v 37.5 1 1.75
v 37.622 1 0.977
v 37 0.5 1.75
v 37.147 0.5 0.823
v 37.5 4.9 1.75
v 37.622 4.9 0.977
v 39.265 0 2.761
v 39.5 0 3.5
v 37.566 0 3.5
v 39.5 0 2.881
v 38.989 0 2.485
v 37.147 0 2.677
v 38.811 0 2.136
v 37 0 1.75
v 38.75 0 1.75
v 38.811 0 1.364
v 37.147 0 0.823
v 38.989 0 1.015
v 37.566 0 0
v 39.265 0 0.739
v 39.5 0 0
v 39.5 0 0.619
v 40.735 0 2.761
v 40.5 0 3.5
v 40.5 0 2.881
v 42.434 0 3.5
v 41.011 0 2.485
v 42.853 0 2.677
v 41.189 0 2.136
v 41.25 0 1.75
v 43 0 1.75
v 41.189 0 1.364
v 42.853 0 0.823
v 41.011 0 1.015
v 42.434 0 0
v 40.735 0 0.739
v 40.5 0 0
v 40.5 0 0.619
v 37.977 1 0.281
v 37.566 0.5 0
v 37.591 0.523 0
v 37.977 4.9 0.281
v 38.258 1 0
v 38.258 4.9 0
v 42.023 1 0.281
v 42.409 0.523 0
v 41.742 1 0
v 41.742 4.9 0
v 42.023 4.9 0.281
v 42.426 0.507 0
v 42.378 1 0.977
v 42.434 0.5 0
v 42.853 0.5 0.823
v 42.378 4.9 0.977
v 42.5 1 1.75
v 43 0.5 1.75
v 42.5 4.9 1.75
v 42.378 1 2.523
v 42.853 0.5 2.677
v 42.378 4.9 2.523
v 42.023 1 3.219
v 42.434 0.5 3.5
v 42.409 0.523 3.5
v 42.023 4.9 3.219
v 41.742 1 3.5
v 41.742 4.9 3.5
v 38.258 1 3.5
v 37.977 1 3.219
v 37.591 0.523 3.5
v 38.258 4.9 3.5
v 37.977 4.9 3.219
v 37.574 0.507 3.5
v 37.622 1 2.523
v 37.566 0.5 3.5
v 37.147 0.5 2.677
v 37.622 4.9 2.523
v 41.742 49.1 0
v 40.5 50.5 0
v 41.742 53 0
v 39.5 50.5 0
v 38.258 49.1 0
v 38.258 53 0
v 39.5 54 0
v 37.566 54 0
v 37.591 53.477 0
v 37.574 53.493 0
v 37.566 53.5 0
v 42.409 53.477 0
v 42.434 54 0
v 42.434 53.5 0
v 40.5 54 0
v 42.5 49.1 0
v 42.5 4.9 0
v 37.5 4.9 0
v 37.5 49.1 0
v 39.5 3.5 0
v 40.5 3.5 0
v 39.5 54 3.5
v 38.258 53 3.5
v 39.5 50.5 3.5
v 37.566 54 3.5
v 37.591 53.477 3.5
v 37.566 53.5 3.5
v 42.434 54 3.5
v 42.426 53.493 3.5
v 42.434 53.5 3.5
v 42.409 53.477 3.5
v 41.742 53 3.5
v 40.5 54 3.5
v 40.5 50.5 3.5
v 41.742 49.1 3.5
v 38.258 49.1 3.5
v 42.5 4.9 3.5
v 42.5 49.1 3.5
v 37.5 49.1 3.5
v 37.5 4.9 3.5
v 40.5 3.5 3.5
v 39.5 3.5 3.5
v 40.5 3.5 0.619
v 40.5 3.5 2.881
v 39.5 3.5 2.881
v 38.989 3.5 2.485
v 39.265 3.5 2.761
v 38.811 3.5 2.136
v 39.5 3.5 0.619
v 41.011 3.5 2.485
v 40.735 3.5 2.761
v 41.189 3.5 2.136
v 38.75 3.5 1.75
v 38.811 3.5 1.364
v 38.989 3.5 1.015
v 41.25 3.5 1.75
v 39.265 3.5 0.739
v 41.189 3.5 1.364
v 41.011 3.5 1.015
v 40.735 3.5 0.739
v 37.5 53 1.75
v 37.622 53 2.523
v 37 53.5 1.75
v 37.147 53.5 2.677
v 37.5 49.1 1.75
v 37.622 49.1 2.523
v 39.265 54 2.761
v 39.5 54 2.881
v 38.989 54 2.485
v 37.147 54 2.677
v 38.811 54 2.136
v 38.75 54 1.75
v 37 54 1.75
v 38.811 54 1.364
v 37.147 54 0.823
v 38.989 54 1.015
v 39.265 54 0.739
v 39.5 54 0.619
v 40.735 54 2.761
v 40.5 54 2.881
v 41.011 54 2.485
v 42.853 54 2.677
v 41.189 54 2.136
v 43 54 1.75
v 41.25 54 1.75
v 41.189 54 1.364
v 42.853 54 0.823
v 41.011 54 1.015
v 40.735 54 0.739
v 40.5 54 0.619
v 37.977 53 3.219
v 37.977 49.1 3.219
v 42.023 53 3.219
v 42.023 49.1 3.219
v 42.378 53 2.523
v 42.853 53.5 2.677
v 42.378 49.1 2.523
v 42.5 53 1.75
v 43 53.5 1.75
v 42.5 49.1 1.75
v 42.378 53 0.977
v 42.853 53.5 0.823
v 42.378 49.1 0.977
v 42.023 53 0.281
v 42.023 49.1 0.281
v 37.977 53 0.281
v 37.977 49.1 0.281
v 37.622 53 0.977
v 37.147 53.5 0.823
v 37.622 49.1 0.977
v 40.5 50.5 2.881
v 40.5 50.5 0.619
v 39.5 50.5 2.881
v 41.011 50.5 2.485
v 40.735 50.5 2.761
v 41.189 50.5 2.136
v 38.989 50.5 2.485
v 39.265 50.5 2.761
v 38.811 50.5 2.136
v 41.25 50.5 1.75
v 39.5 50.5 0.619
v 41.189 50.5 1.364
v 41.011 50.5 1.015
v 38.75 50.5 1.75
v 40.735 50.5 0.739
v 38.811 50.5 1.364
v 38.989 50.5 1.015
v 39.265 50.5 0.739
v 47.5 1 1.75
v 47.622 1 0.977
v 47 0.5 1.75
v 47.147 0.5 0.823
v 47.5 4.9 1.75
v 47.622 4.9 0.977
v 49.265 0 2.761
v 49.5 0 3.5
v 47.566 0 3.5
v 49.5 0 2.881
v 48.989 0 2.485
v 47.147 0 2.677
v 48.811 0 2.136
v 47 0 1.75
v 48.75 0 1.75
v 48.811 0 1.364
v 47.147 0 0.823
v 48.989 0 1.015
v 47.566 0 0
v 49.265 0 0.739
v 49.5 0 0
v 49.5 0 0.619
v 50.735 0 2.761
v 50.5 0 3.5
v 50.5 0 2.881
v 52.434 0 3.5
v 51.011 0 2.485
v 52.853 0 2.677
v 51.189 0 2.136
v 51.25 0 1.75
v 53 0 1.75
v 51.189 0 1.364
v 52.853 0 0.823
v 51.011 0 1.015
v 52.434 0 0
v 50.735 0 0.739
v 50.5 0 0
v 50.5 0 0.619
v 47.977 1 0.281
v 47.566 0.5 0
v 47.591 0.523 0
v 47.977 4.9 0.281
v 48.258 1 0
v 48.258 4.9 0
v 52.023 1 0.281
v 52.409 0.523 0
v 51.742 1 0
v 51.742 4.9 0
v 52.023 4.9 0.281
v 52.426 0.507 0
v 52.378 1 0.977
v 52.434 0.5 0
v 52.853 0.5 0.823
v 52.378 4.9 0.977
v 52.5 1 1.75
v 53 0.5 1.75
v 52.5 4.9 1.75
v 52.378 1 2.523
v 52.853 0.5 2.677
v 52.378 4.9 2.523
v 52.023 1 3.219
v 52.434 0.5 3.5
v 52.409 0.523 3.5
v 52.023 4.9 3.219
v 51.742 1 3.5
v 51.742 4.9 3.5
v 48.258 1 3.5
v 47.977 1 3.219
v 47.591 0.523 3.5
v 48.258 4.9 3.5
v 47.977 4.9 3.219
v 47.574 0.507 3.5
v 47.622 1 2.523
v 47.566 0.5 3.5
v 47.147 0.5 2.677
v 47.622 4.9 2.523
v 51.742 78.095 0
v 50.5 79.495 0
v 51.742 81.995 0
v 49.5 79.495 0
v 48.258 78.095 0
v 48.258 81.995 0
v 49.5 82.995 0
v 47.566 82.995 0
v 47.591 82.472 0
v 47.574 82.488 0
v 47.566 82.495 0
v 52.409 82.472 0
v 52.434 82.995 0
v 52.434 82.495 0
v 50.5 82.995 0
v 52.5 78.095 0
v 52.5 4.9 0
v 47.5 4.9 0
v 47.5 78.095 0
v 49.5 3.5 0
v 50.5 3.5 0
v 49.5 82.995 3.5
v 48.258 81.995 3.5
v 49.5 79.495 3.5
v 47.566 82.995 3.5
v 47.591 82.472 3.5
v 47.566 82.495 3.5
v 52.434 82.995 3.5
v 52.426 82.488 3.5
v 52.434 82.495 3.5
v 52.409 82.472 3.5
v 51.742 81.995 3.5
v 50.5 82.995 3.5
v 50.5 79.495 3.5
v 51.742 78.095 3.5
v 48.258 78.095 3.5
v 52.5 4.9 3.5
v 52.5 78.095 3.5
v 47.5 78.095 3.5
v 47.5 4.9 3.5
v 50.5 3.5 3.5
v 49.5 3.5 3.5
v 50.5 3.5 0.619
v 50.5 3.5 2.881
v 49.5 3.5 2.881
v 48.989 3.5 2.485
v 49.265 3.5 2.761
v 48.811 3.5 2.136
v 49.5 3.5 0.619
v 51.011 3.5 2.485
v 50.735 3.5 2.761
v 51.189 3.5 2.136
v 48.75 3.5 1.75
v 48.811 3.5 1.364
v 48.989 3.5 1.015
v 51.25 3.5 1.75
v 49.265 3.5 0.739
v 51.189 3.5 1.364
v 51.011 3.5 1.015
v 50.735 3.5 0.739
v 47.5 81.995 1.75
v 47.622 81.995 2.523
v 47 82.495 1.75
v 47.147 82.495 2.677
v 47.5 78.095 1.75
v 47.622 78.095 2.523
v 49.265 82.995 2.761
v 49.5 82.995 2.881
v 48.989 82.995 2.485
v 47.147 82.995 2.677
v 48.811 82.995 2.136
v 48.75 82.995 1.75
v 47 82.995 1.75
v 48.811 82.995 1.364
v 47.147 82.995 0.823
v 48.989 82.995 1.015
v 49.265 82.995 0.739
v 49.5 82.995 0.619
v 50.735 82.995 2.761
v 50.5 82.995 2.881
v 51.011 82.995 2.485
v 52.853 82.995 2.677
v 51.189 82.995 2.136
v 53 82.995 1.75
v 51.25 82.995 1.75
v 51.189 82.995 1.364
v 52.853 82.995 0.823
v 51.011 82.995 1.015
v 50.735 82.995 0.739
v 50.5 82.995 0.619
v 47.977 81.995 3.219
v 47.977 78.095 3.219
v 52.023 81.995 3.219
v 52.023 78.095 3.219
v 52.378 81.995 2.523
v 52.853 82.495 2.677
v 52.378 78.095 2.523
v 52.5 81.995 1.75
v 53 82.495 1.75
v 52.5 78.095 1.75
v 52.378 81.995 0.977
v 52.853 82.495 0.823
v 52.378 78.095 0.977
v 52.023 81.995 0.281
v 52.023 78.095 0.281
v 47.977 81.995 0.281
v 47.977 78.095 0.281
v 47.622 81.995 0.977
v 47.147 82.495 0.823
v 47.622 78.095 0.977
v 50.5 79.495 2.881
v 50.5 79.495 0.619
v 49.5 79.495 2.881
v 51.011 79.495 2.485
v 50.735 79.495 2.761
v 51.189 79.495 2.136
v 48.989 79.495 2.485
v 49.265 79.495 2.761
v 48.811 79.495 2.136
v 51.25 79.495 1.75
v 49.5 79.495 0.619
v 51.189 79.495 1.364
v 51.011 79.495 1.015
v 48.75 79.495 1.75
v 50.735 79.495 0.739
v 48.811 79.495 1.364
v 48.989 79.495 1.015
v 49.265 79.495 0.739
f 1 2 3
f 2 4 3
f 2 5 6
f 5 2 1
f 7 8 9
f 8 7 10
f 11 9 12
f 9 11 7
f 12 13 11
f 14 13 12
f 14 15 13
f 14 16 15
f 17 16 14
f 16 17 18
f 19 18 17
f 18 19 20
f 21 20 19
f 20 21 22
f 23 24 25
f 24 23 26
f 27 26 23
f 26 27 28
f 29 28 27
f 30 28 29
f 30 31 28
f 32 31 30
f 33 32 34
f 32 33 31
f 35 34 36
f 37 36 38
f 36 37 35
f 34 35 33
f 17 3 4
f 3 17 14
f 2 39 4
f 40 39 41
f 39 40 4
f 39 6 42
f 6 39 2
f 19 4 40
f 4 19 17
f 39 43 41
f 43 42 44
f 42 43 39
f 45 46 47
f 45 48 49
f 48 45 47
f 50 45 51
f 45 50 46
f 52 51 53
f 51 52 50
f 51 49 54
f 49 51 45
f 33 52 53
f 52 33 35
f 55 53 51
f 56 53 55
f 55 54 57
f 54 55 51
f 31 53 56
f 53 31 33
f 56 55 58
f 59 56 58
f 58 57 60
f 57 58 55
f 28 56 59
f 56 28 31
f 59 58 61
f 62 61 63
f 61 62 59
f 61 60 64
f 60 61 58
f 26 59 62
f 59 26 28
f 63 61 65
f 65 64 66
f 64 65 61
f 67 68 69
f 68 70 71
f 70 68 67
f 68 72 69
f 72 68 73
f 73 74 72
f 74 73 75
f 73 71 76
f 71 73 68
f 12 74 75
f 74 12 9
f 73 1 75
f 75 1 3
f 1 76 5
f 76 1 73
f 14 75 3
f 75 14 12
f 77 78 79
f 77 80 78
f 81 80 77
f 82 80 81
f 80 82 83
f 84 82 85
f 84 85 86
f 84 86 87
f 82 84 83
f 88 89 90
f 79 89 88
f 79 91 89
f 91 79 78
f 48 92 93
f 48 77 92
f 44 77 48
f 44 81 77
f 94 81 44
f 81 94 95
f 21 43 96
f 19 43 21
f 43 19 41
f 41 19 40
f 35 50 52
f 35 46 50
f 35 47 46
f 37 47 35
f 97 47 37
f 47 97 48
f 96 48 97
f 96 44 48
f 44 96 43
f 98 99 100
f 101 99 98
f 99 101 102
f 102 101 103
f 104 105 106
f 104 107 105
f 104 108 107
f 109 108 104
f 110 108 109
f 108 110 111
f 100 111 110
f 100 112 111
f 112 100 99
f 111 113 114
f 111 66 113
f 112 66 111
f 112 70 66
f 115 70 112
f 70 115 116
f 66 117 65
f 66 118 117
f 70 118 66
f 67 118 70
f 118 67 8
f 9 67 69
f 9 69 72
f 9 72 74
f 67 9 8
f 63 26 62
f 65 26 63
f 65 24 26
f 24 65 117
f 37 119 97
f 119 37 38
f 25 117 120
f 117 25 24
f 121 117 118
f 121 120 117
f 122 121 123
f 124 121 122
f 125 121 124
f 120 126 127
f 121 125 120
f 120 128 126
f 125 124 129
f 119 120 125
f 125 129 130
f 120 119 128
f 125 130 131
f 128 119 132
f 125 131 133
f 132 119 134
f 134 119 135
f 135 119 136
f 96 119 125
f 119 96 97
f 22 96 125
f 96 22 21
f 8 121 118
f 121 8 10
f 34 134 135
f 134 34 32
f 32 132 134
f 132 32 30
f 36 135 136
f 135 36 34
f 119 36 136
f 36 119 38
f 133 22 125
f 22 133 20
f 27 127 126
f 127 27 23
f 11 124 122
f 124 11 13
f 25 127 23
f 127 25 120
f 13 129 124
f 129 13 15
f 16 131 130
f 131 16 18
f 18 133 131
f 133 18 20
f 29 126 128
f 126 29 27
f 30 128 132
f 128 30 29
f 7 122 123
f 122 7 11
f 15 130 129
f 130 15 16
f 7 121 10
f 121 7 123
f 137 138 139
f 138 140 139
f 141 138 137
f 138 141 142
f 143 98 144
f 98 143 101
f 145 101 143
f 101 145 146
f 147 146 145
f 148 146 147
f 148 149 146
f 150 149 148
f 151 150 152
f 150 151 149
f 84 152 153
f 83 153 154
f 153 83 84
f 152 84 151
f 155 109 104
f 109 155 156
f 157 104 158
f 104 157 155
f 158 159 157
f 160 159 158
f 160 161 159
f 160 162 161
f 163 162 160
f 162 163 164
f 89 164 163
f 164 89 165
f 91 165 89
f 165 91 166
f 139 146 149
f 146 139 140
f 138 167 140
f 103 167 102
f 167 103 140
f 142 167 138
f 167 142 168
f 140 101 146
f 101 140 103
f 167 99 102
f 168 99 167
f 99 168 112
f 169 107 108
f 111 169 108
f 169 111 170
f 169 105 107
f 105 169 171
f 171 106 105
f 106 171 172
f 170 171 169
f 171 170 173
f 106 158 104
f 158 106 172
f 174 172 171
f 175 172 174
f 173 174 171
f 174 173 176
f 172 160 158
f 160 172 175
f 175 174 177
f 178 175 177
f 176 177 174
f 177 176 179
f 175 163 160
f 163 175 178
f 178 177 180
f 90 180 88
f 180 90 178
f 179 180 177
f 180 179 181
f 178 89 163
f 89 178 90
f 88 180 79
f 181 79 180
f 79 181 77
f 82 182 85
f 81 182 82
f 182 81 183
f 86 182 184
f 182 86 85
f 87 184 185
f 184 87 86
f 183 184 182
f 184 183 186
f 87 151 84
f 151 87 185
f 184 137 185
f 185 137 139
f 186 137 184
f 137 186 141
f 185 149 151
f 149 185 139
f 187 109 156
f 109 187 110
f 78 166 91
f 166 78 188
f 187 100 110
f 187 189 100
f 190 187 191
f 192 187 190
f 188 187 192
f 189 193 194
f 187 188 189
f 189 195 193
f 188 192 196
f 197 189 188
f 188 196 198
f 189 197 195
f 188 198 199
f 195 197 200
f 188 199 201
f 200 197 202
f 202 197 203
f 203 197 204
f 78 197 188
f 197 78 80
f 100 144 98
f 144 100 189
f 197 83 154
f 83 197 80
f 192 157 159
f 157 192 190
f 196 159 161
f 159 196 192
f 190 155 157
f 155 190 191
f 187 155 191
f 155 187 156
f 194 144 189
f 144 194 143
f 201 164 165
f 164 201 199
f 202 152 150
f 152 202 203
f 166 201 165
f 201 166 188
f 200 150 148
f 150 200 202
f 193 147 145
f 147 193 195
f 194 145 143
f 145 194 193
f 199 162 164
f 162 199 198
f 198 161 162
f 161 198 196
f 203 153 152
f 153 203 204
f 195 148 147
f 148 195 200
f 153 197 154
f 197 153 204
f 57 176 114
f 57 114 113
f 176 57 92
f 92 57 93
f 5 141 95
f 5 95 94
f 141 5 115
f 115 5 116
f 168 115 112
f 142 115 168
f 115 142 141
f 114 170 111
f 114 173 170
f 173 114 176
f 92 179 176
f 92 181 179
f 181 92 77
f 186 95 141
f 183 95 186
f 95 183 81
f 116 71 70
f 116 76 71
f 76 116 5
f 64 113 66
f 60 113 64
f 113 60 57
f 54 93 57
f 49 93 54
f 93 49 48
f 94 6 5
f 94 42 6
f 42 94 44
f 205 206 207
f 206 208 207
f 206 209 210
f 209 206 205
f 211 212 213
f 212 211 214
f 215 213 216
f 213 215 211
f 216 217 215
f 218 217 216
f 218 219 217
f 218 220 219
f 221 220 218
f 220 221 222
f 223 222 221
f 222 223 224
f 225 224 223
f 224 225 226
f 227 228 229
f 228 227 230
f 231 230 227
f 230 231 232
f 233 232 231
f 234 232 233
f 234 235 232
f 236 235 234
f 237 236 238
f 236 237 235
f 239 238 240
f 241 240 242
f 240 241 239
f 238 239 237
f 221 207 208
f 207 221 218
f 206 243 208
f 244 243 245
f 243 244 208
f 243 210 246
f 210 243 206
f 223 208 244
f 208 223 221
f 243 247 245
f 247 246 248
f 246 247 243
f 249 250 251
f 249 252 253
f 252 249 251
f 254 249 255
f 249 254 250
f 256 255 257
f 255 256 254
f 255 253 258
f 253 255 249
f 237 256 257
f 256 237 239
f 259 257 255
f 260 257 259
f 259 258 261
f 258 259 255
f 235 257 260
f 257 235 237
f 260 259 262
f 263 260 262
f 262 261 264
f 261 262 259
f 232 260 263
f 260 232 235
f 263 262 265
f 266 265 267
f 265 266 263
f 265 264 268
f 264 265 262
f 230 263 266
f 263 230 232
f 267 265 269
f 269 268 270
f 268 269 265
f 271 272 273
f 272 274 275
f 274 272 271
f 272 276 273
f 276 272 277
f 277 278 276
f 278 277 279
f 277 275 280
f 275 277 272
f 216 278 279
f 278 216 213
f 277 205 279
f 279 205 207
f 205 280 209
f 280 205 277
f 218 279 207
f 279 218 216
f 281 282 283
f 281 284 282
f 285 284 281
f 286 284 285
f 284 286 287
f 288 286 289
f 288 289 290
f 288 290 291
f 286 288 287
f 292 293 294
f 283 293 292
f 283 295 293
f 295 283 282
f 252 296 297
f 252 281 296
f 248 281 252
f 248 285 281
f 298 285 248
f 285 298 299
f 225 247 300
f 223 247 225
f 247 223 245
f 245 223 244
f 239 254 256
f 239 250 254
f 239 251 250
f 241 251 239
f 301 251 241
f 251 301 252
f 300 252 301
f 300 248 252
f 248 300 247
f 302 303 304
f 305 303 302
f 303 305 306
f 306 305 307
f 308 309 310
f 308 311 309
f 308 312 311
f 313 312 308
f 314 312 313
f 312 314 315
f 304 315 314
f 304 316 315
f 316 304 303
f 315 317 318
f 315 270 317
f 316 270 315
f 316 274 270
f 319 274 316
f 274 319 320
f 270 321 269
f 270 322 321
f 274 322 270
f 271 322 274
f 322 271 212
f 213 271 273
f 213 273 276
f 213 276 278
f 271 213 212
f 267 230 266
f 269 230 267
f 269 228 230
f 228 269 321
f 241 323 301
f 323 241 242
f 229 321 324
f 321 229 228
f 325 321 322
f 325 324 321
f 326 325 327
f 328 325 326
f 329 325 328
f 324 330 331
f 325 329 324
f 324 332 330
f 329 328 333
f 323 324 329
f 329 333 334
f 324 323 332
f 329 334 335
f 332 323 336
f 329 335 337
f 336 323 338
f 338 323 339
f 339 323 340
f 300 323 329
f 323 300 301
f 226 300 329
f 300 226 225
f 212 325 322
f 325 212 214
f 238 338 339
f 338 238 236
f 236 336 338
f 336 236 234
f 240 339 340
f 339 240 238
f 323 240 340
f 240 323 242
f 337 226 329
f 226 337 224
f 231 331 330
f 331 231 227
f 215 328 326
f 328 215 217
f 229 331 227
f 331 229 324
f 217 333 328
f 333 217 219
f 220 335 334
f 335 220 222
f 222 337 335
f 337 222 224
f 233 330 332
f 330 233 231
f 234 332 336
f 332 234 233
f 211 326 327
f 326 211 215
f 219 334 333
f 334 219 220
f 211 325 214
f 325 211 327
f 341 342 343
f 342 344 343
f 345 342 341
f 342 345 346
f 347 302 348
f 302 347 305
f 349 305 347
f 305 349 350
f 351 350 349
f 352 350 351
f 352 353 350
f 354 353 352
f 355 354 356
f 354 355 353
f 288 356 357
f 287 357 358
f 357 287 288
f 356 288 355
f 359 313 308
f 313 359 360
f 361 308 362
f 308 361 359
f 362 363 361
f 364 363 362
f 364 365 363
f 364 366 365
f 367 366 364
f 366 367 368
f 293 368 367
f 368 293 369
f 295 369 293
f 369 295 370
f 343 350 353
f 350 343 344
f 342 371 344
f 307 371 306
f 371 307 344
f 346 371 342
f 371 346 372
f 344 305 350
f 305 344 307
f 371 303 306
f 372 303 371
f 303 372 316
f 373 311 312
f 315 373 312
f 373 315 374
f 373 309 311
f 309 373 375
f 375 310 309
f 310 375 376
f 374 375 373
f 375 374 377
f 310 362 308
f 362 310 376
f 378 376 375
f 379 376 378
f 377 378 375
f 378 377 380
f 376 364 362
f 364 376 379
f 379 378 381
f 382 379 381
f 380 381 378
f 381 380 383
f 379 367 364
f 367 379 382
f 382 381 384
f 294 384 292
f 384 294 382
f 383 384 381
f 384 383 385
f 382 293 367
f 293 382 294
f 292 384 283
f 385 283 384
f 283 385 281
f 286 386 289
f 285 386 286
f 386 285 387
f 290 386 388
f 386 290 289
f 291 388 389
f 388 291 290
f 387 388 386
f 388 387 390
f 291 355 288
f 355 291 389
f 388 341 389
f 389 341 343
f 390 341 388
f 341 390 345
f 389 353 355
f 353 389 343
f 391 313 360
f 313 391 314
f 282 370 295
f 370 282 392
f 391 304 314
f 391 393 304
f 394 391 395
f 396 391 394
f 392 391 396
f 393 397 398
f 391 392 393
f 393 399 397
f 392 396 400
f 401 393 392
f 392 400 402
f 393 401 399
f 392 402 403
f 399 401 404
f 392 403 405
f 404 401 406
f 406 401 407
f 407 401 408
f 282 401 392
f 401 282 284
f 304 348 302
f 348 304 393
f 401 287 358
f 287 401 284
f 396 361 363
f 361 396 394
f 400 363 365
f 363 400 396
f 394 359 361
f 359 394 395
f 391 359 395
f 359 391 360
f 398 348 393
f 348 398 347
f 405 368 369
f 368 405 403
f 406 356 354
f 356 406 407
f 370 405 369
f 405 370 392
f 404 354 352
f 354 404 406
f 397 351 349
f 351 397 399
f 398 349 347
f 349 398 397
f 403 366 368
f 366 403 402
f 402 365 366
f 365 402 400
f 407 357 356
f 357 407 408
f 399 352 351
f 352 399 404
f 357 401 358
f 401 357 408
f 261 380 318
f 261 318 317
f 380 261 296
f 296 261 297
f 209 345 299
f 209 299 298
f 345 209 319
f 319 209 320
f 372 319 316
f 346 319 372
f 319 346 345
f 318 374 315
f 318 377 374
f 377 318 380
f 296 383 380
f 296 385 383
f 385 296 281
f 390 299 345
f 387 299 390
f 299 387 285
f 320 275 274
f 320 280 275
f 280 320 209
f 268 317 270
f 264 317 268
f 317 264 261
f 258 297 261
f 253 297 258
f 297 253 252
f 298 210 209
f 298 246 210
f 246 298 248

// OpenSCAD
lipl = 1.0; //lip length
lipd = 6.0;
ebl = 5.0; //overall length of the endbody
linkd = 5.0; //link body diameter
linkh = 3.5; //link body height 
splitw = 1.0;
splitl = 3.5;


SRT = 8.0;
coa = SRT+2.5; //connector octagon apothem (inscribed radius)
cor = coa/(cos(22.5));    //connector octagon radius (circumscribed radius)
coph = cor/(sqrt(1+1/(sqrt(2)))); //connector octagonal prism height

POINTS = 40;

mr = lipd/2 +0.2; //max radius of locking cam surface
subt = 0.2;

ia = 360 / POINTS;

    
polypoints =    ([ 
                    for (i = [0 : POINTS-1]) 
                        [(mr-(subt*((sin(4*i*ia)+1))/2))*cos(i*ia),
                         (mr-(subt*((sin(4*i*ia)+1))/2))*sin(i*ia)] 
                ]);


endbody_points = [
                    [0,0],
                    [0,ebl],
                    [linkd/2,ebl],
                    [linkd/2,lipl],
                    [lipd/2,lipl/2],
                    [lipd/2,0]
                 ];

module endbody(){
    difference(){
        rotate_extrude($fn=20)
        polygon(endbody_points);
        
        //top and bottom cutting cubes
        translate([-5,linkh/2,0])cube([10,10,10]);
        translate([-5,-10-linkh/2,0])cube([10,10,10]);
        
        //split cutting cube
        translate([-splitw/2,-5,0])cube([splitw,10,splitl]);
        
        //split cutting cylinder
        cylinder(h=splitl, d=linkd-2.5,$fn=20);
    }
}

for(i=70){
translate([40,0,0])
    difference(){
        union(){
            translate([0,0,linkh/2])
            rotate(90,[-1,0,0])
            endbody();
            
            translate([-2.5,ebl-0.1,0])
            cube([5,i-(2*SRT)-(2*ebl)+0.2,linkh]);
            
            translate([0,ebl*2 + i-(2*SRT)-(2*ebl),linkh/2])
            rotate(90,[1,0,0])
            endbody();
        }
        /*
        for(j=[0:(i/10)-3]){
            translate([0,-SRT+20 + j*10,0])
            cylinder(h=20,d=3.2,center=true,$fn=15);
        }
        */
    }
    
translate([50,0,0])
    difference(){
        union(){
            translate([0,0,linkh/2])
            rotate(90,[-1,0,0])
            endbody();
            
            translate([-2.5,ebl-0.1,0])
            cube([5,i*sqrt(2)-(2*SRT)-(2*ebl)+0.2,linkh]);
            
            translate([0,ebl*2 + i*sqrt(2)-(2*SRT)-(2*ebl),linkh/2])
            rotate(90,[1,0,0])
            endbody();
        }
        /*
        for(j=[0:(i/10)-3]){
            translate([0,-SRT+2*10*sqrt(2) + j*10*sqrt(2),0])
            cylinder(h=20,d=3.2,center=true,$fn=15);
        }
        */
    }
}

/*
translate([0,0,coa])
rotate(90,[0,1,0])
difference(){
hull()
    union(){
        rotate(22.5)
        cylinder(r=cor,h=coph,$fn=8, center=true);
        
        rotate(90,[1,0,0])
        rotate(22.5)
        cylinder(r=cor,h=coph,$fn=8, center=true);
        
        rotate(90,[0,1,0])
        rotate(22.5)
        cylinder(r=cor,h=coph,$fn=8, center=true);
    }

for(i=[0:7]){
    rotate(45*i)
    translate([0,-SRT,0])
    rotate(90,[1,0,0])
    union(){
           
            linear_extrude(height=0.5)
            rotate(22.5)
            polygon(polypoints);
                
            
            
            difference(){
                scale([1.03,1.03,1])
                rotate_extrude($fn=20)
                polygon(endbody_points);
                translate([0,0,-5+lipl/2])cube([10,10,10],center=true);
            }
            difference(){
                cylinder(h=ebl,d=lipd+0.2,$fn=30);
                translate([-5,linkh/2,0])cube([10,10,10]);
                translate([-5,-10-linkh/2,0])cube([10,10,10]);
            }
        }

}

for(i=[0:3]){
    rotate(90*i)
    rotate(45,[1,0,0])
    translate([0,-SRT,0])
    rotate(90,[1,0,0])
    union(){
           
            linear_extrude(height=0.5)
            rotate(22.5)
            polygon(polypoints);
                
            
            
            difference(){
                scale([1.03,1.03,1])
                rotate_extrude($fn=20)
                polygon(endbody_points);
                translate([0,0,-5+lipl/2])cube([10,10,10],center=true);
            }
            difference(){
                cylinder(h=ebl,d=lipd+0.2,$fn=30);
                translate([-5,linkh/2,0])cube([10,10,10]);
                translate([-5,-10-linkh/2,0])cube([10,10,10]);
            }
        }

}
for(i=[0:3]){
    rotate(90*i)
    rotate(45,[-1,0,0])
    translate([0,-SRT,0])
    rotate(90,[1,0,0])
    union(){
           
            linear_extrude(height=0.5)
            rotate(22.5)
            polygon(polypoints);
                
            
            
            difference(){
                scale([1.03,1.03,1])
                rotate_extrude($fn=20)
                polygon(endbody_points);
                translate([0,0,-5+lipl/2])cube([10,10,10],center=true);
            }
            difference(){
                cylinder(h=ebl,d=lipd+0.2,$fn=30);
                translate([-5,linkh/2,0])cube([10,10,10]);
                translate([-5,-10-linkh/2,0])cube([10,10,10]);
            }
        }

}
for(i=[0:1]){
    rotate(180*i+90,[1,0,0])
    translate([0,-SRT,0])
    rotate(90,[1,0,0])
    union(){
           
            linear_extrude(height=0.5)
            rotate(22.5)
            polygon(polypoints);
                
            
            
            difference(){
                scale([1.03,1.03,1])
                rotate_extrude($fn=20)
                polygon(endbody_points);
                translate([0,0,-5+lipl/2])cube([10,10,10],center=true);
            }
            difference(){
                cylinder(h=ebl,d=lipd+0.2,$fn=30);
                translate([-5,linkh/2,0])cube([10,10,10]);
                translate([-5,-10-linkh/2,0])cube([10,10,10]);
            }
        }

}
cylinder(h=30,d=3.2,center=true,$fn=20);
for(i=[0:3]){
    rotate(i*45,[0,0,1])
    rotate(90,[1,0,0])
    cylinder(h=30,d=3.2,center=true,$fn=20);
}
for(i=[0:3]){
    rotate(i*90,[0,0,1])
    rotate(45,[1,0,0])
    cylinder(h=30,d=3.2,center=true,$fn=20);
}
}
*/
